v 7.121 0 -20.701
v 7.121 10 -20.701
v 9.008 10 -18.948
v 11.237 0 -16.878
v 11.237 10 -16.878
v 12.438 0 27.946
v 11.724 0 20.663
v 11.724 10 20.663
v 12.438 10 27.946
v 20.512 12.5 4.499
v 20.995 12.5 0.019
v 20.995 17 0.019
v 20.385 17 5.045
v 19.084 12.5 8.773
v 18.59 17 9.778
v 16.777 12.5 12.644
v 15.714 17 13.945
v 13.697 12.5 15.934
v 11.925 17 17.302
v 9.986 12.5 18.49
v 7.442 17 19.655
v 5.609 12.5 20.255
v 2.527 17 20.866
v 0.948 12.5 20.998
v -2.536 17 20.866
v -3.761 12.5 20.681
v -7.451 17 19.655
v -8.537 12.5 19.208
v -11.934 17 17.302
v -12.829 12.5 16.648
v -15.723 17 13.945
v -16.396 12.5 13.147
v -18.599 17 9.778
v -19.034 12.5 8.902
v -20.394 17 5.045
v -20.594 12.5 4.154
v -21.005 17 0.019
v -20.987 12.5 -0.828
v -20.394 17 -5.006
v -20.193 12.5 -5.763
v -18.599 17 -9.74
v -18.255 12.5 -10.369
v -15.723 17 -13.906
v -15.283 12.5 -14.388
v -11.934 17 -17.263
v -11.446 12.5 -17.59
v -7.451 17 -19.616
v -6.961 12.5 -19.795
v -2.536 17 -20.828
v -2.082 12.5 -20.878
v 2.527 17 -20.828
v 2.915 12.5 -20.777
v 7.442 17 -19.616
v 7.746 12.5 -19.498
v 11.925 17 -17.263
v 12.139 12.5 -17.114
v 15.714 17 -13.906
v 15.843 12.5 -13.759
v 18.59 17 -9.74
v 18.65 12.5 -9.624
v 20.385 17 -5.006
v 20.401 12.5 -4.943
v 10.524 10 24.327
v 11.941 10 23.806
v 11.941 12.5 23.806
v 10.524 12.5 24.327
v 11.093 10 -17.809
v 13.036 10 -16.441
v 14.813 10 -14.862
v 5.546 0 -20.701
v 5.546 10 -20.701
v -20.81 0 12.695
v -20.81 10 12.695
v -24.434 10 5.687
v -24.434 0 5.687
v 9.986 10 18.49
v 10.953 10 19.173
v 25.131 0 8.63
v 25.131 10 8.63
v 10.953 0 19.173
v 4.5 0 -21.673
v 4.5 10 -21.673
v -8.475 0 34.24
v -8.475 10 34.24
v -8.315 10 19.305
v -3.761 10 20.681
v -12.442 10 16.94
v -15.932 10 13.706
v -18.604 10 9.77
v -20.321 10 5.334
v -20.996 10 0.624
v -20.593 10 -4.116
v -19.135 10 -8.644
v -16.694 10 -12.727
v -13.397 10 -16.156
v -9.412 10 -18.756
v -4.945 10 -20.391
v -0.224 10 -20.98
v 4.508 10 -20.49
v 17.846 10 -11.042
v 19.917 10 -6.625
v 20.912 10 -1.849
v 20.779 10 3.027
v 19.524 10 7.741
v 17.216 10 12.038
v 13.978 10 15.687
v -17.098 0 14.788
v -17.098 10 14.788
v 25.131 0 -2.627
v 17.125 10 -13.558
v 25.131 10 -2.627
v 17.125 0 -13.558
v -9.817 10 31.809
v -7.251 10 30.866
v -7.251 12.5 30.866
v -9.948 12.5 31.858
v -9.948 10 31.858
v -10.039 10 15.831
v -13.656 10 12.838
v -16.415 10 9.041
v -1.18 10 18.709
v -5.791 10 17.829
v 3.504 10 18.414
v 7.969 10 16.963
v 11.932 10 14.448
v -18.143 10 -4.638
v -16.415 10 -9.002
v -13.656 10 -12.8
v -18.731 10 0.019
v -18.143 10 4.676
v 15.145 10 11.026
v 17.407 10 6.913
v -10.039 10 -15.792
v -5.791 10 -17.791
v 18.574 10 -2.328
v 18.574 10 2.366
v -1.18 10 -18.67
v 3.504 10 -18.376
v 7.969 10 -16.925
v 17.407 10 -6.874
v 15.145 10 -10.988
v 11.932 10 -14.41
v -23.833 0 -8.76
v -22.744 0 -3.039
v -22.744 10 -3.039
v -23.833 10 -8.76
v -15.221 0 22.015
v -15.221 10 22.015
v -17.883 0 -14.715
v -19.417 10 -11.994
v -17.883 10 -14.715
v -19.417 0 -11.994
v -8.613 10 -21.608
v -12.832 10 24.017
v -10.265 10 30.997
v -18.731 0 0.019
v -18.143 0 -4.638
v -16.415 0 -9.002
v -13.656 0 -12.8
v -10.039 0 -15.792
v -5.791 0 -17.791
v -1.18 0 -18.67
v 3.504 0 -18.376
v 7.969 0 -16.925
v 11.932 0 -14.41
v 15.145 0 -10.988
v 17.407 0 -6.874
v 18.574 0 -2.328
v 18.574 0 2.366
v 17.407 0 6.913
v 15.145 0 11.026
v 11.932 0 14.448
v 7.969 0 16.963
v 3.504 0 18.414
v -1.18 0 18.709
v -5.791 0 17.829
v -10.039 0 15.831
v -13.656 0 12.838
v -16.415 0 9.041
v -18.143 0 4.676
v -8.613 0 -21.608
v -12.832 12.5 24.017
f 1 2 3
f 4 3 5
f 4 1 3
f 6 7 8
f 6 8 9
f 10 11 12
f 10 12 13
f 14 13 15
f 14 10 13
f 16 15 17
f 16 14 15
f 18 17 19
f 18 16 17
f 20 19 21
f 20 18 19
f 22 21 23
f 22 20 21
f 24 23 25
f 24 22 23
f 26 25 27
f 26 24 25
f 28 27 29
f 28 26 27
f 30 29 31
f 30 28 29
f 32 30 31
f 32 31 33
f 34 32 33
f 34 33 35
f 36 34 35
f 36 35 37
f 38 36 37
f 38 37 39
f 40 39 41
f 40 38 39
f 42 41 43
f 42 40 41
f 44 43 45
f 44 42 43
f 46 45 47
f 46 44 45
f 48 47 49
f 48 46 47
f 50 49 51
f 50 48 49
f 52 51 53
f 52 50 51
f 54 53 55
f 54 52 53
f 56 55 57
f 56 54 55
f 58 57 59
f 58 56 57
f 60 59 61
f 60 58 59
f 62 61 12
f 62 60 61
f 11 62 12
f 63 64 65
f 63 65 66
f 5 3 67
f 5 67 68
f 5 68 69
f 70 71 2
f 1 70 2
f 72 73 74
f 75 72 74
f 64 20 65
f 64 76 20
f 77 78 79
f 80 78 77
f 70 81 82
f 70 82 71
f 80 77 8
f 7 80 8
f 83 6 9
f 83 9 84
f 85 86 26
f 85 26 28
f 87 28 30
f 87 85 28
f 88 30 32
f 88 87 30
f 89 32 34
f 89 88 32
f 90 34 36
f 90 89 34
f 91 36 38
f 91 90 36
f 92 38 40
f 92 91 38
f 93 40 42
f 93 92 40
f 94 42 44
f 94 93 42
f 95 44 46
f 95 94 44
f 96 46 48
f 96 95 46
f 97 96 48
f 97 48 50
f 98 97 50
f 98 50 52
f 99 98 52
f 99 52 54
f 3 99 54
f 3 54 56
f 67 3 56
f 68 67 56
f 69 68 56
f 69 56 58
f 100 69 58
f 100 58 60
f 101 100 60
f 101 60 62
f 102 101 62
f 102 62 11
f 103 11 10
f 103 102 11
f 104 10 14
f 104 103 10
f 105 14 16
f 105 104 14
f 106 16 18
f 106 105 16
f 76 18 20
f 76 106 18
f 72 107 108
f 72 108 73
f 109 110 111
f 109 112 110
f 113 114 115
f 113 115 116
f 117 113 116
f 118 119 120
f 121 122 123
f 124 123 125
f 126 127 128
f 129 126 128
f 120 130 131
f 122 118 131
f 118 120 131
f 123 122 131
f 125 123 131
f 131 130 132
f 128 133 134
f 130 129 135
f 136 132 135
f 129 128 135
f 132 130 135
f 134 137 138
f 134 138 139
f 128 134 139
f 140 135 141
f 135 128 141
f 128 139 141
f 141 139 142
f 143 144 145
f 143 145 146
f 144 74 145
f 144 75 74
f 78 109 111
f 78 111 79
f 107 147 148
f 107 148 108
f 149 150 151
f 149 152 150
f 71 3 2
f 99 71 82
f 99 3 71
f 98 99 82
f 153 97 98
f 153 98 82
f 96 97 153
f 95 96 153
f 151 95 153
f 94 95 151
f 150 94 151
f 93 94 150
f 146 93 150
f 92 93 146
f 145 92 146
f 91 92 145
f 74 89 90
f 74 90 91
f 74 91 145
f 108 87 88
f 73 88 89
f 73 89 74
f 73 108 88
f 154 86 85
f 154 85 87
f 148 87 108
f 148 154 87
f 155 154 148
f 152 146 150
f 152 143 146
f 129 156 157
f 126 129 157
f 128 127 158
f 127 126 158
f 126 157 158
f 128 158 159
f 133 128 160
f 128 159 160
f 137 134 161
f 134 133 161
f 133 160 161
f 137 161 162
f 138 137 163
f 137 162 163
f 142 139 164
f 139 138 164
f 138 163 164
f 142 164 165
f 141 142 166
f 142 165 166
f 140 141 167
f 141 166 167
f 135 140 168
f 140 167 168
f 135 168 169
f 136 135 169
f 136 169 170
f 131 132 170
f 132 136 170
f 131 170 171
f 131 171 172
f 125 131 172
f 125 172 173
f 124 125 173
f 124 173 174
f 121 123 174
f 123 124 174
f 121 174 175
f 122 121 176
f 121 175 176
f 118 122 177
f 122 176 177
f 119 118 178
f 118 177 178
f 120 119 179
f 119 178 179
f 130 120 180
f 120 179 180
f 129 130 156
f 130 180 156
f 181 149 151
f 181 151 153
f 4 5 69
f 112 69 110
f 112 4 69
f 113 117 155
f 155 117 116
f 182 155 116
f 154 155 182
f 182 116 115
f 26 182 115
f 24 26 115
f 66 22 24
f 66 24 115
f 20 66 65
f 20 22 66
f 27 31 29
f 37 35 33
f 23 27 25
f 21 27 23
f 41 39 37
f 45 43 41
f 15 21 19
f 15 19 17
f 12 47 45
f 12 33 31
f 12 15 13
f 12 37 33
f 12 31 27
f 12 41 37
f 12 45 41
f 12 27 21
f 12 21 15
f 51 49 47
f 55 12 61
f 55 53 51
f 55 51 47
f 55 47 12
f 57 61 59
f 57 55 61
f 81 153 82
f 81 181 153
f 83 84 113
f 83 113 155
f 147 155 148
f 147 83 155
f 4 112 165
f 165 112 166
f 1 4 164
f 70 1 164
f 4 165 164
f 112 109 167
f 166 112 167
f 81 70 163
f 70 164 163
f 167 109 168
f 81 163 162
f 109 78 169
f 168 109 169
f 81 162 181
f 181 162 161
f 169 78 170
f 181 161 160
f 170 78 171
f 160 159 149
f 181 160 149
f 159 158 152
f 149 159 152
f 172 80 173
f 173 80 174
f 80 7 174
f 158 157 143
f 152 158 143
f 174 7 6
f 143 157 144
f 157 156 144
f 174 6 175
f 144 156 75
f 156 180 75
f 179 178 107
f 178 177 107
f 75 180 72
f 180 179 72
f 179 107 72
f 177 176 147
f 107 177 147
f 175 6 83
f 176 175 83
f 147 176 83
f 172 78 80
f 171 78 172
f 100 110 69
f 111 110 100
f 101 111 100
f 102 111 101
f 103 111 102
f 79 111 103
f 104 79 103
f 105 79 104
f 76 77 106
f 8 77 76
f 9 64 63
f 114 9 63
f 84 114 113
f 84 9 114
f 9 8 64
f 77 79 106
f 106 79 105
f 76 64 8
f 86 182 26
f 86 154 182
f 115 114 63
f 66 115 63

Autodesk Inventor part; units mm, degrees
ref_plane "YZ Plane" through (0, 0, 0) normal (1, 0, 0) x (0, 1, 0)
ref_plane "XZ Plane" through (0, 0, 0) normal (0, 1, 0) x (-1, 0, 0)
ref_plane "XY Plane" through (0, 0, 0) normal (0, 0, 1) x (1, 0, 0)
sketch "Skizze1" plane through (0, 0, 0) normal (0, 1, 0) x (-1, 0, 0)
  line L0 (-198.8627, 53.5938) -> (99.1639, 53.5938) construction
  line L1 (99.1639, 53.5938) -> (99.1639, -114.0462) construction
  line L2 (99.1639, -114.0462) -> (-198.8627, -114.0462) construction
  line L3 (-198.8627, -114.0462) -> (-198.8627, 53.5938) construction
  circle A0 centre (0.0046, 0.0192) radius 18.7265
  line L4 (-9.419, 18.8182) -> (-23.9308, 8.0268)
  line L5 (-23.9308, 8.0268) -> (-23.9308, -2.2349)
  line L6 (-23.9308, -2.2349) -> (-16.3101, -12.64)
  line L7 (-16.3101, -12.64) -> (-10.5238, -15.9026)
  line L8 (-10.5238, -15.9026) -> (-6.65, -19.5009)
  line L9 (-6.65, -19.5009) -> (-5.075, -19.5009)
  line L10 (-5.075, -19.5009) -> (-4.0313, -20.4704)
  line L11 (-4.0313, -20.4704) -> (8.2132, -20.4099)
  line L12 (8.2132, -20.4099) -> (16.9625, -13.9037)
  line L13 (16.9625, -13.9037) -> (18.4985, -11.1795)
  line L14 (18.4985, -11.1795) -> (22.5122, -8.2399)
  line L15 (22.5122, -8.2399) -> (21.5218, -3.0373)
  line L16 (21.5218, -3.0373) -> (23.1766, 5.5058)
  line L17 (23.1766, 5.5058) -> (19.9087, 11.8258)
  line L18 (19.9087, 11.8258) -> (16.0647, 13.9933)
  line L19 (16.0647, 13.9933) -> (14.1168, 21.4913)
  line L20 (14.1168, 21.4913) -> (7.2513, 30.8655)
  line L21 (7.2513, 30.8655) -> (-10.5238, 24.3271)
  line L22 (-10.5238, 24.3271) -> (-10.5238, 20.9548)
  line L23 (-10.5238, 20.9548) -> (-9.419, 18.8182)
  line L24 (-17.1251, -13.5581) -> (-25.1308, -2.6273)
  line L25 (-25.1308, -2.6273) -> (-25.1308, 8.6299)
  line L26 (-25.1308, 8.6299) -> (-10.9532, 19.1727)
  line L27 (-10.9532, 19.1727) -> (-11.7238, 20.6629)
  line L28 (-11.7238, 20.6629) -> (-12.4385, 27.9461)
  line L29 (-12.4385, 27.9461) -> (8.4751, 34.2404)
  line L30 (8.4751, 34.2404) -> (15.2206, 22.0152)
  line L31 (15.2206, 22.0152) -> (17.098, 14.7883)
  line L32 (17.098, 14.7883) -> (20.8101, 12.6952)
  line L33 (20.8101, 12.6952) -> (24.434, 5.6868)
  line L34 (24.434, 5.6868) -> (22.7438, -3.0393)
  line L35 (22.7438, -3.0393) -> (23.8328, -8.7601)
  line L36 (23.8328, -8.7601) -> (19.4166, -11.9945)
  line L37 (19.4166, -11.9945) -> (17.8827, -14.7148)
  line L38 (17.8827, -14.7148) -> (8.6131, -21.608)
  line L39 (8.6131, -21.608) -> (-4.5001, -21.6727)
  line L40 (-4.5001, -21.6727) -> (-5.5463, -20.7009)
  line L41 (-5.5463, -20.7009) -> (-7.1214, -20.7009)
  line L42 (-7.1214, -20.7009) -> (-11.2367, -16.8783)
  line L43 (-11.2367, -16.8783) -> (-17.1251, -13.5581)
  dimension "d4" = 37.453
  dimension "d29" = 42
  dimension "d45" = 1.2
extrude "Extrusion1" add sketch "Skizze1" along normal blind 10 contours L23 L22 L21 L20 L19 L18 L17 L16 L15 L14 L13 L12 L11 L10 L9 L8 L7 L6 L5 L4 | L24 L25 L26 L27 L28 L29 L30 L31 L32 L33 L34 L35 L36 L37 L38 L39 L40 L41 L42 L43
sketch "Skizze2" plane through (0, 10, 0) normal (0, 1, 0) x (1, 0, 0)
  circle A0 centre (-0.0046, -0.0192) radius 18.7265 projected
  line L0 (-9.9482, -31.8575) -> (-12.8321, -24.0172)
  line L1 (-12.8321, -24.0172) -> (9.0572, -15.9655)
  line L2 (9.0572, -15.9655) -> (11.9411, -23.8058)
  line L3 (11.9411, -23.8058) -> (-9.9482, -31.8575)
  line L4 (-7.2513, -30.8655) -> (10.5238, -24.3271) projected
  circle A1 centre (-0.0046, -0.0192) radius 18.7265 projected
  circle A2 centre (-0.0046, -0.0192) radius 21
  point P0 (0, 0)
  point P1 (9.9588, -18.4167)
  point P2 (9.1919, -16.3319)
  point P3 (1.714, -18.6666)
  point P4 (-12.3868, -23.8534)
  dimension "d38" = 42
extrude "Extrusion2" add sketch "Skizze2" along normal blind 2.5
sketch "Skizze3" plane through (0, 12.5, 0) normal (0, 1, 0) x (1, 0, 0)
  circle A0 centre (-0.0046, -0.0192) radius 18.7265 projected
  circle A1 centre (-0.0046, -0.0192) radius 21
  point P0 (0, 0)
  dimension "d41" = 42
extrude "Extrusion3" add sketch "Skizze3" along normal blind 4.5 contours A0 | A1
properties part number "01_Objektiv"
